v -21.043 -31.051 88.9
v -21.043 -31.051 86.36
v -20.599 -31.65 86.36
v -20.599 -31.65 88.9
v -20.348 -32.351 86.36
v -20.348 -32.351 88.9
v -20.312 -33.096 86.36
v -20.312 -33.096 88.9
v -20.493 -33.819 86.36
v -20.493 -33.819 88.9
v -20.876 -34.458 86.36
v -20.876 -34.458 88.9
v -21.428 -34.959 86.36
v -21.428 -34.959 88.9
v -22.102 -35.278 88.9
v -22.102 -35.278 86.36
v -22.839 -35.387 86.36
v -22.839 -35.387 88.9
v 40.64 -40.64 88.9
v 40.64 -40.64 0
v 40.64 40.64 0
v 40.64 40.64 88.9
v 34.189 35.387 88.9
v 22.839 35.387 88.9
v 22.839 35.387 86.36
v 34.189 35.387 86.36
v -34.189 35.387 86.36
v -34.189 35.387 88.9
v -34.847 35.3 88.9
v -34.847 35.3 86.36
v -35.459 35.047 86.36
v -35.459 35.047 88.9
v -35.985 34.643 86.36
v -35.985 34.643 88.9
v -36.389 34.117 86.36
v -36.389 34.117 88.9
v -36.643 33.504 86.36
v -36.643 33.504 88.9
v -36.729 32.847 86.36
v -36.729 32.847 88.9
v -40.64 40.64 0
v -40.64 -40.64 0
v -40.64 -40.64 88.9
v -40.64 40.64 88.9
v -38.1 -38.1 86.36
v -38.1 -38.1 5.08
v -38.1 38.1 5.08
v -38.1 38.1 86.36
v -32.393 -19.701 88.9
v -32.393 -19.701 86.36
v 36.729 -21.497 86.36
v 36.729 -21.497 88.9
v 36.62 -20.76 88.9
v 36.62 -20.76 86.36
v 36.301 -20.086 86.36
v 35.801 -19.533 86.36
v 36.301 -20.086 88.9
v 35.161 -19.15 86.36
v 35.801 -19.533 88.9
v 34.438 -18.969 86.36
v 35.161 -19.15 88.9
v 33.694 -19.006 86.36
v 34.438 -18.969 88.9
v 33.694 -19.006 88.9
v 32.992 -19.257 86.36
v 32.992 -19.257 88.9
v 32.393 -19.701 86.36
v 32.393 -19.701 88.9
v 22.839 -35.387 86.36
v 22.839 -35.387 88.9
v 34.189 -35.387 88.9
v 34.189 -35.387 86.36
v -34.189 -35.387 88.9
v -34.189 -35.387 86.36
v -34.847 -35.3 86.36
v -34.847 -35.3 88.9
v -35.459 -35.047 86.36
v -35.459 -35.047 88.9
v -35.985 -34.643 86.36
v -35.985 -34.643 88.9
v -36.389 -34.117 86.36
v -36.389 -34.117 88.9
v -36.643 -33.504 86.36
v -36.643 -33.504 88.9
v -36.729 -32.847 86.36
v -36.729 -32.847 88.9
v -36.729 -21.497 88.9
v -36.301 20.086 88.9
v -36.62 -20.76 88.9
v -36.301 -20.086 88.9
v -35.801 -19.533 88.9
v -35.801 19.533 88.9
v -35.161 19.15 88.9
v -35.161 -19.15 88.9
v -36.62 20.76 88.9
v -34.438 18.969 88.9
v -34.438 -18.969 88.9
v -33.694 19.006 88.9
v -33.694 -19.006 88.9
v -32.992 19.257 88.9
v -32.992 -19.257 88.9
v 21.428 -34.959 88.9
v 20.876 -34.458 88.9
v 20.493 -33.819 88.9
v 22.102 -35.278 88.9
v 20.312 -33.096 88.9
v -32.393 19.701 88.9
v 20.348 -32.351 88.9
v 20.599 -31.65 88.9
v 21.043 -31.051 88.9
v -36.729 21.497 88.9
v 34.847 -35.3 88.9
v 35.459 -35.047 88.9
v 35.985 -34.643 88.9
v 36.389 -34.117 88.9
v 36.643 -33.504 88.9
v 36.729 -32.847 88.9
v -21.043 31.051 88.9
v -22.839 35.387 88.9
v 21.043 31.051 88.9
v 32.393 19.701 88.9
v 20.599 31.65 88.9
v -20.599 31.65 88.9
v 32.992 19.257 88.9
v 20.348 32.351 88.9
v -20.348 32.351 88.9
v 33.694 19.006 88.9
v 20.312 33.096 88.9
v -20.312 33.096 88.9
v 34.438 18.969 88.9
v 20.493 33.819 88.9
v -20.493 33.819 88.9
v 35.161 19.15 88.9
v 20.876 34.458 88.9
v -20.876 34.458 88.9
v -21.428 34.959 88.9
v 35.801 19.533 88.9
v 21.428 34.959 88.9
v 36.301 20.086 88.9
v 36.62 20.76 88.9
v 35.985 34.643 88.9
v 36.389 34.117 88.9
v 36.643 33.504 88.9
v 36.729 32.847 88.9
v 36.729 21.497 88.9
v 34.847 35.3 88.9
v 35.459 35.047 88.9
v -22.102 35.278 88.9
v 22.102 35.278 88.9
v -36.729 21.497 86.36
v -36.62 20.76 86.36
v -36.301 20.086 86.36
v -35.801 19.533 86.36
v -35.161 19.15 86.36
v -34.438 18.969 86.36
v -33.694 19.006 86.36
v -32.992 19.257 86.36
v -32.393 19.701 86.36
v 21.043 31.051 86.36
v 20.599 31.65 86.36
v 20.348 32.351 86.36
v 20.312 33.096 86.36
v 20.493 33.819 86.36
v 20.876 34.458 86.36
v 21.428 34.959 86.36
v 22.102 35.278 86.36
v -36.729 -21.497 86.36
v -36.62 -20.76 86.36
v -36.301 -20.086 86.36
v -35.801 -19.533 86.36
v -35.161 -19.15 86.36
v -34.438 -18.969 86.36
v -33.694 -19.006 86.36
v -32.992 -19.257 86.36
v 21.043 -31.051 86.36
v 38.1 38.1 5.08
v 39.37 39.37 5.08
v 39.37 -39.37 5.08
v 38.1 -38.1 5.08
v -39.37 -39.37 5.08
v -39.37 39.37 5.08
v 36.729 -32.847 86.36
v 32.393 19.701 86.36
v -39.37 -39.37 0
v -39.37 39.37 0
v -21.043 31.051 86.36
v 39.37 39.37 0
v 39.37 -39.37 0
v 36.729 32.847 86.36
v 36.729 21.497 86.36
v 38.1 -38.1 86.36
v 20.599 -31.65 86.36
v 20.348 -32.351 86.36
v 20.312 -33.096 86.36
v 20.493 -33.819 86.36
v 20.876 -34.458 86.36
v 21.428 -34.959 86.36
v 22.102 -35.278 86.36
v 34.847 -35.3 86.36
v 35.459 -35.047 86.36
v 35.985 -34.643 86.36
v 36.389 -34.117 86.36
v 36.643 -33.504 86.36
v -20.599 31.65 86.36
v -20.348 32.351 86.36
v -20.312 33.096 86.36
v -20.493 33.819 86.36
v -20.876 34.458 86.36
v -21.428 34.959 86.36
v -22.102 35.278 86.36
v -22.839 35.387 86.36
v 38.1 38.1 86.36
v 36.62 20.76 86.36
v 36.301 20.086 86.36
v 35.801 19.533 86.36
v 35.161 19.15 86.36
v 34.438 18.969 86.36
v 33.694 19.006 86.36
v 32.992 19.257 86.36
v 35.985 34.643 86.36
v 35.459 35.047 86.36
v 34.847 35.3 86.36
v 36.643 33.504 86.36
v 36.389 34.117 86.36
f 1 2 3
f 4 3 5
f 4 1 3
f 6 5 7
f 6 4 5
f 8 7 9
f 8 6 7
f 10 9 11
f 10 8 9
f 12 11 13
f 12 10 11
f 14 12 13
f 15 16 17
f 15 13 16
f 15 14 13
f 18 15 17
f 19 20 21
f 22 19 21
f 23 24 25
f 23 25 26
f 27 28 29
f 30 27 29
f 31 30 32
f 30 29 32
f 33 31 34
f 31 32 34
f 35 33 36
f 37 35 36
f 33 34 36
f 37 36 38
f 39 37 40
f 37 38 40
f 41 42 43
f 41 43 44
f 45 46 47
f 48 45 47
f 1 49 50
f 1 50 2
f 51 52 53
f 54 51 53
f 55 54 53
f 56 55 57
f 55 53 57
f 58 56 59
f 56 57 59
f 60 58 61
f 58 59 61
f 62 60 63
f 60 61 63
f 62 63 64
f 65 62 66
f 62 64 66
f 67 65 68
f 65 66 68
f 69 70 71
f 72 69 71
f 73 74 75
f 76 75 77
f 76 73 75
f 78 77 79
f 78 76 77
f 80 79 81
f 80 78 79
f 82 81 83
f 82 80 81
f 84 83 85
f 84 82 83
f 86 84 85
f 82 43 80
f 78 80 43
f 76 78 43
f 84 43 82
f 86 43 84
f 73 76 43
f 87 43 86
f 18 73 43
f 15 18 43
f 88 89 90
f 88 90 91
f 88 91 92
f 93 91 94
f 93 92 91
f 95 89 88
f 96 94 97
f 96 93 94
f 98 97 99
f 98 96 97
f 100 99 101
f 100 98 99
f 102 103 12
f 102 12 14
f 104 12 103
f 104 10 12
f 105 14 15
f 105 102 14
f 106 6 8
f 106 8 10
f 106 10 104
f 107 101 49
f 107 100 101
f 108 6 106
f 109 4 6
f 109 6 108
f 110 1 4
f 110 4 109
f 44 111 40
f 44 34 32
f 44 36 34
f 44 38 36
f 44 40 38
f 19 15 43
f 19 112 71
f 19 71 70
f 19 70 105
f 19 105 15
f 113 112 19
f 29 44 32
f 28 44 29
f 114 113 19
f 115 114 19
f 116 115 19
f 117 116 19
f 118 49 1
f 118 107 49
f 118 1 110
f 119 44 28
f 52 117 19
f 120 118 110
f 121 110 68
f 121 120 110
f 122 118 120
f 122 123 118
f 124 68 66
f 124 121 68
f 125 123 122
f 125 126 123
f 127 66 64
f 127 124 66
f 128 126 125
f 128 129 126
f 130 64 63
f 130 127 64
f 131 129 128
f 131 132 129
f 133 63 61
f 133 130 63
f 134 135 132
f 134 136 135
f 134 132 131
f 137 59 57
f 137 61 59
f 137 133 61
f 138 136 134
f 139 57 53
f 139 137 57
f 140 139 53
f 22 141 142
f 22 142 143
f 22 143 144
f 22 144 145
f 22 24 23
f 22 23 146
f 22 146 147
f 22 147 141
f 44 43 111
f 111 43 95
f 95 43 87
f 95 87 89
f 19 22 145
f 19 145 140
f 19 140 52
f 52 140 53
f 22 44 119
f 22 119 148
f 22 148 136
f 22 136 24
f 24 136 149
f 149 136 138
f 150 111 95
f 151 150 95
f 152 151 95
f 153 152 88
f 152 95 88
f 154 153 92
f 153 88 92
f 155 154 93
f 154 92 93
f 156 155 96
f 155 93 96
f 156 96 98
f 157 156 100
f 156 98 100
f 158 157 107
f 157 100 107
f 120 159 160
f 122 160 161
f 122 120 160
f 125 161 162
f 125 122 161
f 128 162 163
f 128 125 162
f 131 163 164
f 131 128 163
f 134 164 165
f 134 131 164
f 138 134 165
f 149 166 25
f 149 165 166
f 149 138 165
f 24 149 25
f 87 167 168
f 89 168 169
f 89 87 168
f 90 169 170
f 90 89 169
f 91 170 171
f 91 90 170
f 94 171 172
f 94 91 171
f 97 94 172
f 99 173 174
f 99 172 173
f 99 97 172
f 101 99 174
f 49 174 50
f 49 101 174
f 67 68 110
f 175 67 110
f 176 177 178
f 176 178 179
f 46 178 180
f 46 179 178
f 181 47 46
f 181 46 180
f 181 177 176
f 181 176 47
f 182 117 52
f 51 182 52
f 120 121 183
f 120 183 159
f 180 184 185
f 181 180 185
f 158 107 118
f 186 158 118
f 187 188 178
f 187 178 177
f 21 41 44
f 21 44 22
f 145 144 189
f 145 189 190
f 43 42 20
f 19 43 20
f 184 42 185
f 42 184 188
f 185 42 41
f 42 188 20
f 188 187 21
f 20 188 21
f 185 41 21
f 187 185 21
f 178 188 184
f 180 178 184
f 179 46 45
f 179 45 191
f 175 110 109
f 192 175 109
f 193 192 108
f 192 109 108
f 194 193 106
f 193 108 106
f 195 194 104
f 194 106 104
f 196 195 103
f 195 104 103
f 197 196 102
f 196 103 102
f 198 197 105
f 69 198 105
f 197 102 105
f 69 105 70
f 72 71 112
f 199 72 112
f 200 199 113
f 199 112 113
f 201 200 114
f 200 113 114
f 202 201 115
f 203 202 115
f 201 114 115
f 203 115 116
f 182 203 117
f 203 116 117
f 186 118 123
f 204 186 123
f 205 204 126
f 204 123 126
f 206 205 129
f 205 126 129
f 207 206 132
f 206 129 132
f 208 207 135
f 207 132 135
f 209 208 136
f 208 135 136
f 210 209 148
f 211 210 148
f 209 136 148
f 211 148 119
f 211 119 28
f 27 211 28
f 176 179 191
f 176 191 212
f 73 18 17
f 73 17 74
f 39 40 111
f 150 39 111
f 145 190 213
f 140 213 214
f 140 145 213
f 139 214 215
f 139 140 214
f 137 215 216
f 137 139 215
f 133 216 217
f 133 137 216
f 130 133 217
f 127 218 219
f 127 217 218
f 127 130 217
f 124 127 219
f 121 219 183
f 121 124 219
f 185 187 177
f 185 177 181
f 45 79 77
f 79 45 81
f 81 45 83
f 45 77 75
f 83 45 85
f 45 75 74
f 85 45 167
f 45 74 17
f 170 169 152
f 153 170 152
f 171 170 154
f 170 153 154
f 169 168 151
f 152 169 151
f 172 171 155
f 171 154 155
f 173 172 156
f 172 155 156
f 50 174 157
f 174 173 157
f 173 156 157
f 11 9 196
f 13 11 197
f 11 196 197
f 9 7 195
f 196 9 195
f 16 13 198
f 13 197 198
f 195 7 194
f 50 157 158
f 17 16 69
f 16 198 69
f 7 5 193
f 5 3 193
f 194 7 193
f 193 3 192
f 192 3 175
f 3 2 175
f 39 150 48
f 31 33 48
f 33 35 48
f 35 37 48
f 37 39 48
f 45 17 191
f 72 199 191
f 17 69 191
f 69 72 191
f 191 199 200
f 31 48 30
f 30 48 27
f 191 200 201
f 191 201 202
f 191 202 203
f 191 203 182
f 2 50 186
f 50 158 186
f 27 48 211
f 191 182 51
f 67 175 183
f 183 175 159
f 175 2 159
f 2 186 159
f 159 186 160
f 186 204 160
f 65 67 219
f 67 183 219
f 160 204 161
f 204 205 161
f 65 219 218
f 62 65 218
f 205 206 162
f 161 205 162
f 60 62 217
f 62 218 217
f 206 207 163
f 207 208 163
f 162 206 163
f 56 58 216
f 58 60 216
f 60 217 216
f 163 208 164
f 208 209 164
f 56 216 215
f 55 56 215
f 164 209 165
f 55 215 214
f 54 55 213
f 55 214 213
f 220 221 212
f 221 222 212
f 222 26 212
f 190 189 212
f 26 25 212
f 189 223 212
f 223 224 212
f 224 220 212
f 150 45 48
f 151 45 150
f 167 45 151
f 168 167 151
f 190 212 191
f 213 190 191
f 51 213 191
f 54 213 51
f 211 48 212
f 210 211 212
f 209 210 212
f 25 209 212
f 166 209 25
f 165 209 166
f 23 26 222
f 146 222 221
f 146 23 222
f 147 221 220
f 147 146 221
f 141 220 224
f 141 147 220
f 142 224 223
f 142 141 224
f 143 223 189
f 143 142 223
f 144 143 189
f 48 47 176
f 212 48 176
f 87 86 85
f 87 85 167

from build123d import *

# Parameters (mm, degrees)
SKETCH1_W           = 81.28
SKETCH1_H           = 81.28
BOSS_EXTRUDE1_DEPTH = 88.9
SHELL1_T            = -2.54
SKETCH4_W           = 78.74
SKETCH4_H           = 78.74
CUT_EXTRUDE2_DEPTH  = 5.08
CUT_EXTRUDE3_DEPTH  = 17.78


with BuildPart() as part:
    # Sketch1 → Boss-Extrude1 (new body)
    with BuildSketch(Plane.XY):
        Rectangle(SKETCH1_W, SKETCH1_H)
    extrude(amount=BOSS_EXTRUDE1_DEPTH)

    # Shell1
    shell1_openings = [part.faces().sort_by_distance(p)[0] for p in [
        (0, 0, 0),
    ]]
    offset(amount=SHELL1_T, openings=shell1_openings, kind=Kind.INTERSECTION)

    # Sketch4 → Cut-Extrude2 (cut)
    with BuildSketch(Plane(origin=(0, 0, 0), x_dir=(-1, 0, 0), z_dir=(0, 0, -1))):
        Rectangle(SKETCH4_W, SKETCH4_H)
    extrude(amount=-CUT_EXTRUDE2_DEPTH, mode=Mode.SUBTRACT)

    # Sketch5 → Cut-Extrude3 (cut)
    with BuildSketch(Plane.XY.offset(88.9)):
        with BuildLine():
            Line((-36.729338969, 32.846931931), (-36.729338969, 21.496884439))
            ThreePointArc((-36.729338969, 21.496884439), (-35.161354887, 19.150230426), (-32.393287744, 19.700833215))
            Line((-32.393287744, 19.700833215), (-21.043240252, 31.050880707))
            ThreePointArc((-21.043240252, 31.050880707), (-20.492637463, 33.81894785), (-22.839291476, 35.386931931))
            Line((-22.839291476, 35.386931931), (-34.189338969, 35.386931931))
            ThreePointArc((-34.189338969, 35.386931931), (-35.985390193, 34.642983156), (-36.729338969, 32.846931931))
        make_face()
        with BuildLine():
            Line((32.393287744, 19.700833215), (21.043240252, 31.050880707))
            ThreePointArc((21.043240252, 31.050880707), (20.492637463, 33.81894785), (22.839291476, 35.386931931))
            Line((22.839291476, 35.386931931), (34.189338969, 35.386931931))
            ThreePointArc((34.189338969, 35.386931931), (35.985390193, 34.642983156), (36.729338969, 32.846931931))
            Line((36.729338969, 32.846931931), (36.729338969, 21.496884439))
            ThreePointArc((36.729338969, 21.496884439), (35.161354887, 19.150230426), (32.393287744, 19.700833215))
        make_face()
        with BuildLine():
            Line((32.393287744, -19.700833215), (21.043240252, -31.050880707))
            ThreePointArc((21.043240252, -31.050880707), (20.492637463, -33.81894785), (22.839291476, -35.386931931))
            Line((22.839291476, -35.386931931), (34.189338969, -35.386931931))
            ThreePointArc((34.189338969, -35.386931931), (35.985390193, -34.642983156), (36.729338969, -32.846931931))
            Line((36.729338969, -32.846931931), (36.729338969, -21.496884439))
            ThreePointArc((36.729338969, -21.496884439), (35.161354887, -19.150230426), (32.393287744, -19.700833215))
        make_face()
        with BuildLine():
            Line((-32.393287744, -19.700833215), (-21.043240252, -31.050880707))
            ThreePointArc((-21.043240252, -31.050880707), (-20.492637463, -33.81894785), (-22.839291476, -35.386931931))
            Line((-22.839291476, -35.386931931), (-34.189338969, -35.386931931))
            ThreePointArc((-34.189338969, -35.386931931), (-35.985390193, -34.642983156), (-36.729338969, -32.846931931))
            Line((-36.729338969, -32.846931931), (-36.729338969, -21.496884439))
            ThreePointArc((-36.729338969, -21.496884439), (-35.161354887, -19.150230426), (-32.393287744, -19.700833215))
        make_face()
    extrude(amount=-CUT_EXTRUDE3_DEPTH, mode=Mode.SUBTRACT)


solid = part.part
